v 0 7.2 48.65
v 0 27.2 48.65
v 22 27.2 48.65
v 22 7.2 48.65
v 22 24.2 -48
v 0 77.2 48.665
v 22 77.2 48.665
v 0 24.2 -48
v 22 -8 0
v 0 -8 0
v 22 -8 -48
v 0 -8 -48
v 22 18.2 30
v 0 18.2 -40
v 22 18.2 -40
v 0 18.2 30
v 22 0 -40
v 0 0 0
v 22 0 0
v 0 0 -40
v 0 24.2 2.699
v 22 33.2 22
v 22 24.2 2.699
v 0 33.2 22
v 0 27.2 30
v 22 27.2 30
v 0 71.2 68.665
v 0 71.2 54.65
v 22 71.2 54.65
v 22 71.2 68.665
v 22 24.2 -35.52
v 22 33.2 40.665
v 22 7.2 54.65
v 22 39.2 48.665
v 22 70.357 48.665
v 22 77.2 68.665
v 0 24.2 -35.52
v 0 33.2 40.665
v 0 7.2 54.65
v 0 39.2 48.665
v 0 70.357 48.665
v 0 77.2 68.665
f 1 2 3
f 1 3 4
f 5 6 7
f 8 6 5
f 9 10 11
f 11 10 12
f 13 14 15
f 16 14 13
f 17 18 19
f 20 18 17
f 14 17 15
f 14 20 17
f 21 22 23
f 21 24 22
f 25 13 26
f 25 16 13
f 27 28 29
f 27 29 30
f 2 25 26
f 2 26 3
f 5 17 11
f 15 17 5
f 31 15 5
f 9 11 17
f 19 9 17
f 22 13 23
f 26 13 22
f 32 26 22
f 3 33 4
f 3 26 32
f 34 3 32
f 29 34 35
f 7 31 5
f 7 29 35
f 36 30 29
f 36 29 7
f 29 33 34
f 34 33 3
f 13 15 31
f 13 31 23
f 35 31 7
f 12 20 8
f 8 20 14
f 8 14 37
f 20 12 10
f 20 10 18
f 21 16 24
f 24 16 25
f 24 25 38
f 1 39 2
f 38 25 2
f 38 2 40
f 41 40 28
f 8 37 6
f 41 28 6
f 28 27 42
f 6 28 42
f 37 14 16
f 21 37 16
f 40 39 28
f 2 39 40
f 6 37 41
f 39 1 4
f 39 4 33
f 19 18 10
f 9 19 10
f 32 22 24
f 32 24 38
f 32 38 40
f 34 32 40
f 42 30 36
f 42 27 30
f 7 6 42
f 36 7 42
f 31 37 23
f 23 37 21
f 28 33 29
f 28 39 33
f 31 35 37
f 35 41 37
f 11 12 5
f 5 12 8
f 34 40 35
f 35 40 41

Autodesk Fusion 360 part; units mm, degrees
sketch "Sketch1" plane through (0, 0, 0) normal (1, 0, 0) x (0, 1, 0)
  line L0 (0, 0) -> (0, -40)
  line L1 (0, -40) -> (18.2, -40)
  line L2 (18.2, -40) -> (18.2, 30)
  line L3 (18.2, 30) -> (27.2, 30)
  line L4 (27.2, 30) -> (27.2, 48.65)
  line L5 (33.2, 48.6647) -> (77.2, 48.6647)
  line L6 (77.2, 48.6647) -> (77.2, 68.6647)
  line L7 (27.2, 48.65) -> (7.2, 48.65)
  line L8 (0, 0) -> (-8, 0)
  line L9 (-8, 0) -> (-8, -48)
  line L10 (-8, -48) -> (24.2, -48)
  line L11 (24.2, -48) -> (24.2, 2.6994)
  line L12 (33.2, 22) -> (33.2, 40.6647)
  line L13 (33.2, 40.6647) -> (33.2, 48.6647)
  line L14 (7.2, 48.65) -> (7.2, 54.65)
  line L15 (7.2, 54.65) -> (71.2, 54.65)
  line L16 (71.2, 54.65) -> (71.2, 68.6647)
  line L17 (71.2, 68.6647) -> (77.2, 68.6647)
  line L18 (33.2, 22) -> (24.2, 2.6994)
  line L19 (77.2, 48.6647) -> (24.2, -48)
  line L20 (70.3573, 48.6647) -> (24.2, -35.5199)
  line L21 (33.2, 40.6647) -> (39.2, 48.6647)
  dimension "d1" = 40
  dimension "d2" = 18.2
  dimension "d3" = 70
  dimension "d4" = 9
  dimension "d5" = 18.65
  dimension "d6" = 50
  dimension "d7" = 20
  dimension "d8" = 20
  dimension "d9" = 8
  dimension "d10" = 8
  dimension "d11" = 6
  dimension "d13" = 6
  dimension "d14" = 25
  dimension "d15" = 8
  dimension "d16" = 6
  dimension "d17" = 6
  dimension "d18" = 44
  dimension "d21" = 6
  dimension "d22" = 6
  dimension "d23" = 8
extrude "Extrude1" add sketch "Sketch1" along normal blind 22 contours L0 L1 L2 L3 L4 L5 L6 L7 L8 L9 L10 L11 L12 L13 L14 L15 L16 L17 L18 | L5 L11 L19 L20 | L5 L13 L21
